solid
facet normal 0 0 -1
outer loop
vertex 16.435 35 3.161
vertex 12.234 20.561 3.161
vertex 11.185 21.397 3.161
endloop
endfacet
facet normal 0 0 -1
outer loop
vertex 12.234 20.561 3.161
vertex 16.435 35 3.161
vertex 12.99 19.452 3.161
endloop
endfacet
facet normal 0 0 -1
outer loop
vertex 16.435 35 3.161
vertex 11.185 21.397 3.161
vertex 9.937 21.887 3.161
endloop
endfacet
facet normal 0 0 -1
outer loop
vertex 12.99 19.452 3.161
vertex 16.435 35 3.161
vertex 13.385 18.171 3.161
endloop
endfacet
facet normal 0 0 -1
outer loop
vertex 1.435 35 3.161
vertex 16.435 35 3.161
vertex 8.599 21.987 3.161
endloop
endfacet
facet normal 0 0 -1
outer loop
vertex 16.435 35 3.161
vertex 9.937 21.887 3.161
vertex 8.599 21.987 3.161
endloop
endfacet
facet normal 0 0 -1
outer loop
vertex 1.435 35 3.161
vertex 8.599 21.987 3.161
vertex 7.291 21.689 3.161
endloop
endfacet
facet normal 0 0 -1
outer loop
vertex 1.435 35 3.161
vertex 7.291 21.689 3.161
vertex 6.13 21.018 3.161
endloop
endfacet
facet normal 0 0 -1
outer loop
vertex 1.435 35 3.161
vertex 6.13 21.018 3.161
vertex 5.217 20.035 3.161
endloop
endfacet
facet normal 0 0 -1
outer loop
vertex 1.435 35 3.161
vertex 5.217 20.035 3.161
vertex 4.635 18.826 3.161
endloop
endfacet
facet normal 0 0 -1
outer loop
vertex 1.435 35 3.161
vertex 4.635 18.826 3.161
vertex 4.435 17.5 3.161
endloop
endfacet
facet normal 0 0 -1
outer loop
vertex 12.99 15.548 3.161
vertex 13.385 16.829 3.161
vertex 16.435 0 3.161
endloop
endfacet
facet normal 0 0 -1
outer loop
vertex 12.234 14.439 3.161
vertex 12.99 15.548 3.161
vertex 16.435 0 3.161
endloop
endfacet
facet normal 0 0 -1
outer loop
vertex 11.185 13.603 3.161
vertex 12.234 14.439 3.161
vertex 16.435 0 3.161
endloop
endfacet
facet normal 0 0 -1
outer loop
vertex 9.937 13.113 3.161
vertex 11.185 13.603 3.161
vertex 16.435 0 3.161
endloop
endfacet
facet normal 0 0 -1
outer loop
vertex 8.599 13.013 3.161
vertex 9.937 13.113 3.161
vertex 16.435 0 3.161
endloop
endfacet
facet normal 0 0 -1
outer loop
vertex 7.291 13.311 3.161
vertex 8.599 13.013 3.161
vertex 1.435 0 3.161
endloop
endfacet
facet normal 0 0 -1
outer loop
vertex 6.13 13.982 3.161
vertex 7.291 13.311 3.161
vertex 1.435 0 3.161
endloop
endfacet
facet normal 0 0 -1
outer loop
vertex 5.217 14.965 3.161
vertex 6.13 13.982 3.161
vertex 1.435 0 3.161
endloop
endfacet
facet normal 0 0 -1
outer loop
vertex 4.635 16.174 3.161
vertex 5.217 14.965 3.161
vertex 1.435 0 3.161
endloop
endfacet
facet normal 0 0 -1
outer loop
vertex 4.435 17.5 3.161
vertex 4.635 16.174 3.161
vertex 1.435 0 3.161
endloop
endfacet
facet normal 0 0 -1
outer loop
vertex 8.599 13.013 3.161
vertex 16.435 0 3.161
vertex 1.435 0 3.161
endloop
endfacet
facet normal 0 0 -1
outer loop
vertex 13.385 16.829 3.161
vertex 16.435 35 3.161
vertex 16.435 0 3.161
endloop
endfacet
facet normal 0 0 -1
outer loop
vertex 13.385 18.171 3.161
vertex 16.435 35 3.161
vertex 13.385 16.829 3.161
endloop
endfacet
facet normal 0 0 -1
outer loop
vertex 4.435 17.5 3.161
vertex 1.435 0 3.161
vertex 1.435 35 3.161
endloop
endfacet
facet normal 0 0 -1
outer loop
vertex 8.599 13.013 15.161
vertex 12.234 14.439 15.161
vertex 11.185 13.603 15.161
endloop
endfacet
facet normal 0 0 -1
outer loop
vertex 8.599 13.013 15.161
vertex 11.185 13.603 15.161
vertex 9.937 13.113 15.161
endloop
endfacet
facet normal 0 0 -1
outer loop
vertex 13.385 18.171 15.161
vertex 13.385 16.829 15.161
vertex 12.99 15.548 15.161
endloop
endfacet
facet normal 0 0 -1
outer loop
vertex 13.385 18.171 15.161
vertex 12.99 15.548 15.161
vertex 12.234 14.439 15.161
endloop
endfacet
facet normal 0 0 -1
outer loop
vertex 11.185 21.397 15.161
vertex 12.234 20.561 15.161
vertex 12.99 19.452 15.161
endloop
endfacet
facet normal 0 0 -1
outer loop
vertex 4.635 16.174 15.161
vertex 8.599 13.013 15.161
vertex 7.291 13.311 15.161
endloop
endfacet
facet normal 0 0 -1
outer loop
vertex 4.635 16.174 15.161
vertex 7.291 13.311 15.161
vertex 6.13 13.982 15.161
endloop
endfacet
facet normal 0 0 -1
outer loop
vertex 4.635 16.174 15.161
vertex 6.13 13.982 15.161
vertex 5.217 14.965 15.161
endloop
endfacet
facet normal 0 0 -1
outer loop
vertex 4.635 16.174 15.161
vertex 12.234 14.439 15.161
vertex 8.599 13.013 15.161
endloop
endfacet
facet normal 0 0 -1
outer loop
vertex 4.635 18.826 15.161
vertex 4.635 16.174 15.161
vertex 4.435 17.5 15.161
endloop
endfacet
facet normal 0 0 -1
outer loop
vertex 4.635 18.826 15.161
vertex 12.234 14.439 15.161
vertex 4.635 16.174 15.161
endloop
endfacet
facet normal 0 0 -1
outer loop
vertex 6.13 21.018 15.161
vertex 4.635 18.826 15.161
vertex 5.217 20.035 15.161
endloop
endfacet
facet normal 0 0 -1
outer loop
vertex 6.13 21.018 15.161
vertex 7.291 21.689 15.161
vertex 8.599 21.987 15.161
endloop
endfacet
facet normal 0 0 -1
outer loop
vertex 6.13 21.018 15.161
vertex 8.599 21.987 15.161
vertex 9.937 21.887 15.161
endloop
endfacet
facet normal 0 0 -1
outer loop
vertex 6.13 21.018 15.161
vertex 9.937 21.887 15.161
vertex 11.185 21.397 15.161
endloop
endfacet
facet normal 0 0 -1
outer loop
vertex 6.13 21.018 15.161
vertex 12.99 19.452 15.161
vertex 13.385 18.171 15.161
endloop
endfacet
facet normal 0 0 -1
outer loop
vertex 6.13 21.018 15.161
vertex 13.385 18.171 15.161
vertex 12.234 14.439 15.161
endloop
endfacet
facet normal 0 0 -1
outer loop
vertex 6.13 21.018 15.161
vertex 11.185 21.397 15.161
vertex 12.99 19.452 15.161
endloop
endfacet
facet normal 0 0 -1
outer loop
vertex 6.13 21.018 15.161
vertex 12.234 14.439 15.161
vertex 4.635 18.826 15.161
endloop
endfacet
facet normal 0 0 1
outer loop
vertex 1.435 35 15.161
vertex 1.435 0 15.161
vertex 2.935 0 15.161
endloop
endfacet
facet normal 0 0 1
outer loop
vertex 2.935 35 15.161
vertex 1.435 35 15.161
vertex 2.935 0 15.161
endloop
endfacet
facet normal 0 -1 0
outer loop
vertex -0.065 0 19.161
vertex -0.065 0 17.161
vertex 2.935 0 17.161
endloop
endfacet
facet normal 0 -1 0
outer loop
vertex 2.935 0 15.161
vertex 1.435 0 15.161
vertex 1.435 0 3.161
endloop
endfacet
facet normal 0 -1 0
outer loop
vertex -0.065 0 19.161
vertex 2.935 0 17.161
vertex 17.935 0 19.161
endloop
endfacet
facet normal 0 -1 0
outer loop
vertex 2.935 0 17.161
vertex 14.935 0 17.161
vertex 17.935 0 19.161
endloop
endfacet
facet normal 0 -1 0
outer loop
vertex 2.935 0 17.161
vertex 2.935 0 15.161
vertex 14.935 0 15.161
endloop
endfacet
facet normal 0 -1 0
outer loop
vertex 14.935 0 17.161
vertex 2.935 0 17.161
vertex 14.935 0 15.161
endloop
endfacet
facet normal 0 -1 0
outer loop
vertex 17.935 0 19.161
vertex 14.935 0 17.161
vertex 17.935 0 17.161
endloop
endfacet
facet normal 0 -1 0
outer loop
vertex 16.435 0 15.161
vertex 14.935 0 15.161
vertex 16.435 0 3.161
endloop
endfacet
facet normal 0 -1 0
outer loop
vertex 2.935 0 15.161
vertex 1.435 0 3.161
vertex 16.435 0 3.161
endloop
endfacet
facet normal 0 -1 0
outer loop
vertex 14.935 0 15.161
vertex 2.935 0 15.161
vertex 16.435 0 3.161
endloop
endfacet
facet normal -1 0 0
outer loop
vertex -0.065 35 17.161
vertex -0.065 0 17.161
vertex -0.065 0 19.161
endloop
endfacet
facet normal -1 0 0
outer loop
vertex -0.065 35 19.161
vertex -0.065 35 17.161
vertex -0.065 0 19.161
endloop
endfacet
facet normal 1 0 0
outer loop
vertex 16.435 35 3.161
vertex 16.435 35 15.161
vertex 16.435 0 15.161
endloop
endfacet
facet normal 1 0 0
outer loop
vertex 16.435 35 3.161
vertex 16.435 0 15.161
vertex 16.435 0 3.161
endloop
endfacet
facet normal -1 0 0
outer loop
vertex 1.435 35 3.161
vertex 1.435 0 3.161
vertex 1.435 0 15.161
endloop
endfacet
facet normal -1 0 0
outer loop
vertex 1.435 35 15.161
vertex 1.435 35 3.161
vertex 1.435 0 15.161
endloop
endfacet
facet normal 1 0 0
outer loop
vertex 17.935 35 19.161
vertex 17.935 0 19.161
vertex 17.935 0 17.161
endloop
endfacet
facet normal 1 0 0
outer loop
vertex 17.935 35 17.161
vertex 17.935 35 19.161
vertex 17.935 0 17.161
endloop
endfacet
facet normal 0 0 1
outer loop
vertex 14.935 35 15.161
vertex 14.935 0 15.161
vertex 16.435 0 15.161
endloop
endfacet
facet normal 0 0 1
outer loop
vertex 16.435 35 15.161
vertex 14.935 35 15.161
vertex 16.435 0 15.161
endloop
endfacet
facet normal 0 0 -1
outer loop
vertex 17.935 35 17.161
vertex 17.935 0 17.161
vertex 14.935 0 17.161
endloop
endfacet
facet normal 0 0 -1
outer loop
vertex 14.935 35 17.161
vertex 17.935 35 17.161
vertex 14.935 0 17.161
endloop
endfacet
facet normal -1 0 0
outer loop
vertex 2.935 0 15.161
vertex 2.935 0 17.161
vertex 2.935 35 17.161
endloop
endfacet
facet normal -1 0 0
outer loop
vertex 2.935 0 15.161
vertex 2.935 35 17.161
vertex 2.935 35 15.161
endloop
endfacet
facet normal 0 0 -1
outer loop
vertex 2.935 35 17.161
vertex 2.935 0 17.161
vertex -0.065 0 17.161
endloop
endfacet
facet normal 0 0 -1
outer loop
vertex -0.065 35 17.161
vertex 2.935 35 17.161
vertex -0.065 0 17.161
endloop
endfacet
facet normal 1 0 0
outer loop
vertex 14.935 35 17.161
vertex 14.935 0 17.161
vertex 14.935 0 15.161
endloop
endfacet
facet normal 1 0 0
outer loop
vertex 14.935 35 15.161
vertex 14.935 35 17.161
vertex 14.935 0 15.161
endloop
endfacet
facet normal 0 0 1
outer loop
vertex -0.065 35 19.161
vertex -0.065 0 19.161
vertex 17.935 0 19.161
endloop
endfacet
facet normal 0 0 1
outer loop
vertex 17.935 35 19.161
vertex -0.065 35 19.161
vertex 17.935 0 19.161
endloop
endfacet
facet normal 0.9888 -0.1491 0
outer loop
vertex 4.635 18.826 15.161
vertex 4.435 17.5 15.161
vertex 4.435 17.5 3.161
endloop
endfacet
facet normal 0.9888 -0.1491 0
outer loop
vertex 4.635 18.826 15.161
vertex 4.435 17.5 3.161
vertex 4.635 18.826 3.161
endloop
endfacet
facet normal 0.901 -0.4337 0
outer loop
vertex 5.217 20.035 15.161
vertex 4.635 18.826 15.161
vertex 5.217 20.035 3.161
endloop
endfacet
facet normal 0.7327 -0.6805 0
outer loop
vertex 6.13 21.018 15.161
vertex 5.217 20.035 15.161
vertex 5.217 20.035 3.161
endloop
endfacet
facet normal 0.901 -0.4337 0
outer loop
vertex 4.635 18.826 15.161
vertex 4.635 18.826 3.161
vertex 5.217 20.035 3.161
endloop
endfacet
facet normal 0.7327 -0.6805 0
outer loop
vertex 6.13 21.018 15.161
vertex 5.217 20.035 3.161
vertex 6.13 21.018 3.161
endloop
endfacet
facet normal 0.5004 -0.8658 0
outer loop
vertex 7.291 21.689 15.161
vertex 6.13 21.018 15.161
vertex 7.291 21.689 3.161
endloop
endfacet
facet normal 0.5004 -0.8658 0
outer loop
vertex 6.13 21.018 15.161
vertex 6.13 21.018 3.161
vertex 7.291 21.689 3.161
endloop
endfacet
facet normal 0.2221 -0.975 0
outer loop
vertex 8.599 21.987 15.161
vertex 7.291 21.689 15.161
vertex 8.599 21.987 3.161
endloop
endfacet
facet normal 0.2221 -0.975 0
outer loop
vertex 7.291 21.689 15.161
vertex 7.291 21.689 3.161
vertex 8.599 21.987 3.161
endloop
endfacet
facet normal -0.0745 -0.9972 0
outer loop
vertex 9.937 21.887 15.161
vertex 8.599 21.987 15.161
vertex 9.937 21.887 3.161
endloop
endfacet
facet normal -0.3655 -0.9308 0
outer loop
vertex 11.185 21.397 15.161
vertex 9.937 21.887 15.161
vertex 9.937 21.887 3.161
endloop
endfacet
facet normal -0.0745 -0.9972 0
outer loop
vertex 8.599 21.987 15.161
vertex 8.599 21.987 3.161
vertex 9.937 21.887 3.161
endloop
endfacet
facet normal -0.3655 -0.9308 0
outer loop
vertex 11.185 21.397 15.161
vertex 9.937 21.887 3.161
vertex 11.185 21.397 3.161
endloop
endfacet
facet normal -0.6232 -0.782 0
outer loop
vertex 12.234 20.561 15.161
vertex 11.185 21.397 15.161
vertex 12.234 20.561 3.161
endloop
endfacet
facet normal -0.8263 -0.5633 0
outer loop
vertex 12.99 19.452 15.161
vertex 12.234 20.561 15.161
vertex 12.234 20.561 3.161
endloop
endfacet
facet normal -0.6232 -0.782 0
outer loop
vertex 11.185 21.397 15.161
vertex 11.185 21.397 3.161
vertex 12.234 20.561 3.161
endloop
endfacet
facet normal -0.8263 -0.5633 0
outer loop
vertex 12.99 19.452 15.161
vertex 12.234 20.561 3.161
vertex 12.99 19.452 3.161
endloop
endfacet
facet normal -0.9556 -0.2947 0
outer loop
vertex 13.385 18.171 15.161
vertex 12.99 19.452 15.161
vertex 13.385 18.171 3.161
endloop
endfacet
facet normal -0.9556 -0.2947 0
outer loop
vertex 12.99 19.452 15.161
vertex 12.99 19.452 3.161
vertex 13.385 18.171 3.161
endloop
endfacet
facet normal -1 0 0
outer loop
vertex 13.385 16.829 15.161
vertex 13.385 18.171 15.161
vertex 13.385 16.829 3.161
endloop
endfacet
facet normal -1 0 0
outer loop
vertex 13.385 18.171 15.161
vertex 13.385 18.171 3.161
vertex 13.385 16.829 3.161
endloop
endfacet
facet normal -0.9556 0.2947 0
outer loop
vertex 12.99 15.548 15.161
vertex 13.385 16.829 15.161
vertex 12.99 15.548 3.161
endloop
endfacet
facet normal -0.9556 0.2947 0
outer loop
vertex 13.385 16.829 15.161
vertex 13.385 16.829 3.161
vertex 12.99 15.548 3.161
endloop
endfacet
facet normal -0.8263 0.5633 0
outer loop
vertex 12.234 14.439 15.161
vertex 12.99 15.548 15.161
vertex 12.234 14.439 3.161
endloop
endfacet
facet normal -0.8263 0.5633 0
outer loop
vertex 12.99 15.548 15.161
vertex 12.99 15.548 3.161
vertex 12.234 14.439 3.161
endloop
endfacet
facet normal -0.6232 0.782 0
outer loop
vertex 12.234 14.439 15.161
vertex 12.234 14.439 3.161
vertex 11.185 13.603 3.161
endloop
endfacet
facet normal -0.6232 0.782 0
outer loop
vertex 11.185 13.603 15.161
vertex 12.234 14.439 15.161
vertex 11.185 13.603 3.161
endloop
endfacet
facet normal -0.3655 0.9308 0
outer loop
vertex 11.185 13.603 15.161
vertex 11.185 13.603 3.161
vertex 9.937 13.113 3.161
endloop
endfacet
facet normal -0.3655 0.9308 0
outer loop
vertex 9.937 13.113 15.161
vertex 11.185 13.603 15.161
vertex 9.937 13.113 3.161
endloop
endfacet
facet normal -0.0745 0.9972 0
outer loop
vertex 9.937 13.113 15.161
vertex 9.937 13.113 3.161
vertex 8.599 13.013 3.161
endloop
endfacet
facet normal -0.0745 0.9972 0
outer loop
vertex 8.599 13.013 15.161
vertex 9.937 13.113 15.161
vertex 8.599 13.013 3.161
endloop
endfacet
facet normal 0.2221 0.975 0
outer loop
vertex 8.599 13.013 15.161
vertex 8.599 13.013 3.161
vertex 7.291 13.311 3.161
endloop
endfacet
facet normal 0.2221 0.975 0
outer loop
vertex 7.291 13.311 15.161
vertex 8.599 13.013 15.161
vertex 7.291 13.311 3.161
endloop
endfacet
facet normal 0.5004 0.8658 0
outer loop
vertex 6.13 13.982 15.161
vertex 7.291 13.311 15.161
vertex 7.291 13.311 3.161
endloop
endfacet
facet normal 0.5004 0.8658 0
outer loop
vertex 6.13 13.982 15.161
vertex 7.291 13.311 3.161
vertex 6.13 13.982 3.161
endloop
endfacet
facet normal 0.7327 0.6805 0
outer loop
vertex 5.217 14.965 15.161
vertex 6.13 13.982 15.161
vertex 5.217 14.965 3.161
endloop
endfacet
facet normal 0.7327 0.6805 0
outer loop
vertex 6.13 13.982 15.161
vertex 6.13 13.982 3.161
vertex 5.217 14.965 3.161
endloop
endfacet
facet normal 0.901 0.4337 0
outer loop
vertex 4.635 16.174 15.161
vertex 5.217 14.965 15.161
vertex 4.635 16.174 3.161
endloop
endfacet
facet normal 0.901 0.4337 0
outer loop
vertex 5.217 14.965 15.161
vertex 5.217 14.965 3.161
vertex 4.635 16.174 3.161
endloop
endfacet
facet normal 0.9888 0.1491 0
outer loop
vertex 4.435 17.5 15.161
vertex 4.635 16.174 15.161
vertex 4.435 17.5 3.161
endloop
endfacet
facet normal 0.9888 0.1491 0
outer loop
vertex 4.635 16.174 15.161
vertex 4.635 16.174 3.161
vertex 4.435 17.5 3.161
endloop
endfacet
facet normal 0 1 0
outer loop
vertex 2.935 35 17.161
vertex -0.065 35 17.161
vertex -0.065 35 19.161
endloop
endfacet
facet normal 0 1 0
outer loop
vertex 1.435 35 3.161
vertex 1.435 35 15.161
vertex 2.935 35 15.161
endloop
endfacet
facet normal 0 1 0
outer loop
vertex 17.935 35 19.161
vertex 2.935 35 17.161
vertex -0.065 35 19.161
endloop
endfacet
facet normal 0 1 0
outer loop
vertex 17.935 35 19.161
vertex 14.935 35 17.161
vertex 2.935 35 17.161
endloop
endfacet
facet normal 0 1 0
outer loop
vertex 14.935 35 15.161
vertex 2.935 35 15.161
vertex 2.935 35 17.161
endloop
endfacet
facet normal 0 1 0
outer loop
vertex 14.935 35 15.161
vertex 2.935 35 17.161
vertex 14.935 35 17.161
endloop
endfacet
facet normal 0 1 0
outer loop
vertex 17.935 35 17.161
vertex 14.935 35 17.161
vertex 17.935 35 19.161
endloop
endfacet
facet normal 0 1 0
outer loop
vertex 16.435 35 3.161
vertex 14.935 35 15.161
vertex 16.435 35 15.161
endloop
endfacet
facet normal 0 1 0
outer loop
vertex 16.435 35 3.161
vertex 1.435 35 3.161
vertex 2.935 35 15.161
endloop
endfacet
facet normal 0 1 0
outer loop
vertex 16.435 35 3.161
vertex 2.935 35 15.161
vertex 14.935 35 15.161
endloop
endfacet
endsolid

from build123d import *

# Parameters (mm, degrees)
SKETCH1_W           = 6
SKETCH1_H           = 2
BOSS_EXTRUDE1_DEPTH = 35
SKETCH2_R           = 4.5
CUT_EXTRUDE1_DEPTH  = 12


with BuildPart() as part:
    # Sketch1 → Boss-Extrude1 (new body)
    with BuildSketch(Plane(origin=(0, 0, 0), x_dir=(1, 0, 0), z_dir=(0, 1, 0))):
        Polygon((1.435483871, -3.161290323), (1.435483871, -15.161290323), (2.935483871, -15.161290323), (8.935483871, -15.161290323), (8.935483871, -3.161290323), align=None)
        Polygon((16.435483871, -3.161290323), (8.935483871, -3.161290323), (8.935483871, -15.161290323), (14.935483871, -15.161290323), (16.435483871, -15.161290323), align=None)
        with Locations((11.935483871, -16.161290323)):
            Rectangle(SKETCH1_W, SKETCH1_H)
        with Locations((5.935483871, -16.161290323)):
            Rectangle(SKETCH1_W, SKETCH1_H)
        Polygon((8.935483871, -17.161290323), (2.935483871, -17.161290323), (-0.064516129, -17.161290323), (-0.064516129, -19.161290323), (8.935483871, -19.161290323), align=None)
        Polygon((14.935483871, -17.161290323), (8.935483871, -17.161290323), (8.935483871, -19.161290323), (17.935483871, -19.161290323), (17.935483871, -17.161290323), align=None)
    extrude(amount=BOSS_EXTRUDE1_DEPTH)

    # Sketch2 → Cut-Extrude1 (cut)
    with BuildSketch(Plane(origin=(0, 0, 3.161290323), x_dir=(-1, 0, 0), z_dir=(0, 0, -1))):
        with Locations((-8.935483871, 17.5)):
            Circle(SKETCH2_R)
    extrude(amount=-CUT_EXTRUDE1_DEPTH, mode=Mode.SUBTRACT)


solid = part.part
